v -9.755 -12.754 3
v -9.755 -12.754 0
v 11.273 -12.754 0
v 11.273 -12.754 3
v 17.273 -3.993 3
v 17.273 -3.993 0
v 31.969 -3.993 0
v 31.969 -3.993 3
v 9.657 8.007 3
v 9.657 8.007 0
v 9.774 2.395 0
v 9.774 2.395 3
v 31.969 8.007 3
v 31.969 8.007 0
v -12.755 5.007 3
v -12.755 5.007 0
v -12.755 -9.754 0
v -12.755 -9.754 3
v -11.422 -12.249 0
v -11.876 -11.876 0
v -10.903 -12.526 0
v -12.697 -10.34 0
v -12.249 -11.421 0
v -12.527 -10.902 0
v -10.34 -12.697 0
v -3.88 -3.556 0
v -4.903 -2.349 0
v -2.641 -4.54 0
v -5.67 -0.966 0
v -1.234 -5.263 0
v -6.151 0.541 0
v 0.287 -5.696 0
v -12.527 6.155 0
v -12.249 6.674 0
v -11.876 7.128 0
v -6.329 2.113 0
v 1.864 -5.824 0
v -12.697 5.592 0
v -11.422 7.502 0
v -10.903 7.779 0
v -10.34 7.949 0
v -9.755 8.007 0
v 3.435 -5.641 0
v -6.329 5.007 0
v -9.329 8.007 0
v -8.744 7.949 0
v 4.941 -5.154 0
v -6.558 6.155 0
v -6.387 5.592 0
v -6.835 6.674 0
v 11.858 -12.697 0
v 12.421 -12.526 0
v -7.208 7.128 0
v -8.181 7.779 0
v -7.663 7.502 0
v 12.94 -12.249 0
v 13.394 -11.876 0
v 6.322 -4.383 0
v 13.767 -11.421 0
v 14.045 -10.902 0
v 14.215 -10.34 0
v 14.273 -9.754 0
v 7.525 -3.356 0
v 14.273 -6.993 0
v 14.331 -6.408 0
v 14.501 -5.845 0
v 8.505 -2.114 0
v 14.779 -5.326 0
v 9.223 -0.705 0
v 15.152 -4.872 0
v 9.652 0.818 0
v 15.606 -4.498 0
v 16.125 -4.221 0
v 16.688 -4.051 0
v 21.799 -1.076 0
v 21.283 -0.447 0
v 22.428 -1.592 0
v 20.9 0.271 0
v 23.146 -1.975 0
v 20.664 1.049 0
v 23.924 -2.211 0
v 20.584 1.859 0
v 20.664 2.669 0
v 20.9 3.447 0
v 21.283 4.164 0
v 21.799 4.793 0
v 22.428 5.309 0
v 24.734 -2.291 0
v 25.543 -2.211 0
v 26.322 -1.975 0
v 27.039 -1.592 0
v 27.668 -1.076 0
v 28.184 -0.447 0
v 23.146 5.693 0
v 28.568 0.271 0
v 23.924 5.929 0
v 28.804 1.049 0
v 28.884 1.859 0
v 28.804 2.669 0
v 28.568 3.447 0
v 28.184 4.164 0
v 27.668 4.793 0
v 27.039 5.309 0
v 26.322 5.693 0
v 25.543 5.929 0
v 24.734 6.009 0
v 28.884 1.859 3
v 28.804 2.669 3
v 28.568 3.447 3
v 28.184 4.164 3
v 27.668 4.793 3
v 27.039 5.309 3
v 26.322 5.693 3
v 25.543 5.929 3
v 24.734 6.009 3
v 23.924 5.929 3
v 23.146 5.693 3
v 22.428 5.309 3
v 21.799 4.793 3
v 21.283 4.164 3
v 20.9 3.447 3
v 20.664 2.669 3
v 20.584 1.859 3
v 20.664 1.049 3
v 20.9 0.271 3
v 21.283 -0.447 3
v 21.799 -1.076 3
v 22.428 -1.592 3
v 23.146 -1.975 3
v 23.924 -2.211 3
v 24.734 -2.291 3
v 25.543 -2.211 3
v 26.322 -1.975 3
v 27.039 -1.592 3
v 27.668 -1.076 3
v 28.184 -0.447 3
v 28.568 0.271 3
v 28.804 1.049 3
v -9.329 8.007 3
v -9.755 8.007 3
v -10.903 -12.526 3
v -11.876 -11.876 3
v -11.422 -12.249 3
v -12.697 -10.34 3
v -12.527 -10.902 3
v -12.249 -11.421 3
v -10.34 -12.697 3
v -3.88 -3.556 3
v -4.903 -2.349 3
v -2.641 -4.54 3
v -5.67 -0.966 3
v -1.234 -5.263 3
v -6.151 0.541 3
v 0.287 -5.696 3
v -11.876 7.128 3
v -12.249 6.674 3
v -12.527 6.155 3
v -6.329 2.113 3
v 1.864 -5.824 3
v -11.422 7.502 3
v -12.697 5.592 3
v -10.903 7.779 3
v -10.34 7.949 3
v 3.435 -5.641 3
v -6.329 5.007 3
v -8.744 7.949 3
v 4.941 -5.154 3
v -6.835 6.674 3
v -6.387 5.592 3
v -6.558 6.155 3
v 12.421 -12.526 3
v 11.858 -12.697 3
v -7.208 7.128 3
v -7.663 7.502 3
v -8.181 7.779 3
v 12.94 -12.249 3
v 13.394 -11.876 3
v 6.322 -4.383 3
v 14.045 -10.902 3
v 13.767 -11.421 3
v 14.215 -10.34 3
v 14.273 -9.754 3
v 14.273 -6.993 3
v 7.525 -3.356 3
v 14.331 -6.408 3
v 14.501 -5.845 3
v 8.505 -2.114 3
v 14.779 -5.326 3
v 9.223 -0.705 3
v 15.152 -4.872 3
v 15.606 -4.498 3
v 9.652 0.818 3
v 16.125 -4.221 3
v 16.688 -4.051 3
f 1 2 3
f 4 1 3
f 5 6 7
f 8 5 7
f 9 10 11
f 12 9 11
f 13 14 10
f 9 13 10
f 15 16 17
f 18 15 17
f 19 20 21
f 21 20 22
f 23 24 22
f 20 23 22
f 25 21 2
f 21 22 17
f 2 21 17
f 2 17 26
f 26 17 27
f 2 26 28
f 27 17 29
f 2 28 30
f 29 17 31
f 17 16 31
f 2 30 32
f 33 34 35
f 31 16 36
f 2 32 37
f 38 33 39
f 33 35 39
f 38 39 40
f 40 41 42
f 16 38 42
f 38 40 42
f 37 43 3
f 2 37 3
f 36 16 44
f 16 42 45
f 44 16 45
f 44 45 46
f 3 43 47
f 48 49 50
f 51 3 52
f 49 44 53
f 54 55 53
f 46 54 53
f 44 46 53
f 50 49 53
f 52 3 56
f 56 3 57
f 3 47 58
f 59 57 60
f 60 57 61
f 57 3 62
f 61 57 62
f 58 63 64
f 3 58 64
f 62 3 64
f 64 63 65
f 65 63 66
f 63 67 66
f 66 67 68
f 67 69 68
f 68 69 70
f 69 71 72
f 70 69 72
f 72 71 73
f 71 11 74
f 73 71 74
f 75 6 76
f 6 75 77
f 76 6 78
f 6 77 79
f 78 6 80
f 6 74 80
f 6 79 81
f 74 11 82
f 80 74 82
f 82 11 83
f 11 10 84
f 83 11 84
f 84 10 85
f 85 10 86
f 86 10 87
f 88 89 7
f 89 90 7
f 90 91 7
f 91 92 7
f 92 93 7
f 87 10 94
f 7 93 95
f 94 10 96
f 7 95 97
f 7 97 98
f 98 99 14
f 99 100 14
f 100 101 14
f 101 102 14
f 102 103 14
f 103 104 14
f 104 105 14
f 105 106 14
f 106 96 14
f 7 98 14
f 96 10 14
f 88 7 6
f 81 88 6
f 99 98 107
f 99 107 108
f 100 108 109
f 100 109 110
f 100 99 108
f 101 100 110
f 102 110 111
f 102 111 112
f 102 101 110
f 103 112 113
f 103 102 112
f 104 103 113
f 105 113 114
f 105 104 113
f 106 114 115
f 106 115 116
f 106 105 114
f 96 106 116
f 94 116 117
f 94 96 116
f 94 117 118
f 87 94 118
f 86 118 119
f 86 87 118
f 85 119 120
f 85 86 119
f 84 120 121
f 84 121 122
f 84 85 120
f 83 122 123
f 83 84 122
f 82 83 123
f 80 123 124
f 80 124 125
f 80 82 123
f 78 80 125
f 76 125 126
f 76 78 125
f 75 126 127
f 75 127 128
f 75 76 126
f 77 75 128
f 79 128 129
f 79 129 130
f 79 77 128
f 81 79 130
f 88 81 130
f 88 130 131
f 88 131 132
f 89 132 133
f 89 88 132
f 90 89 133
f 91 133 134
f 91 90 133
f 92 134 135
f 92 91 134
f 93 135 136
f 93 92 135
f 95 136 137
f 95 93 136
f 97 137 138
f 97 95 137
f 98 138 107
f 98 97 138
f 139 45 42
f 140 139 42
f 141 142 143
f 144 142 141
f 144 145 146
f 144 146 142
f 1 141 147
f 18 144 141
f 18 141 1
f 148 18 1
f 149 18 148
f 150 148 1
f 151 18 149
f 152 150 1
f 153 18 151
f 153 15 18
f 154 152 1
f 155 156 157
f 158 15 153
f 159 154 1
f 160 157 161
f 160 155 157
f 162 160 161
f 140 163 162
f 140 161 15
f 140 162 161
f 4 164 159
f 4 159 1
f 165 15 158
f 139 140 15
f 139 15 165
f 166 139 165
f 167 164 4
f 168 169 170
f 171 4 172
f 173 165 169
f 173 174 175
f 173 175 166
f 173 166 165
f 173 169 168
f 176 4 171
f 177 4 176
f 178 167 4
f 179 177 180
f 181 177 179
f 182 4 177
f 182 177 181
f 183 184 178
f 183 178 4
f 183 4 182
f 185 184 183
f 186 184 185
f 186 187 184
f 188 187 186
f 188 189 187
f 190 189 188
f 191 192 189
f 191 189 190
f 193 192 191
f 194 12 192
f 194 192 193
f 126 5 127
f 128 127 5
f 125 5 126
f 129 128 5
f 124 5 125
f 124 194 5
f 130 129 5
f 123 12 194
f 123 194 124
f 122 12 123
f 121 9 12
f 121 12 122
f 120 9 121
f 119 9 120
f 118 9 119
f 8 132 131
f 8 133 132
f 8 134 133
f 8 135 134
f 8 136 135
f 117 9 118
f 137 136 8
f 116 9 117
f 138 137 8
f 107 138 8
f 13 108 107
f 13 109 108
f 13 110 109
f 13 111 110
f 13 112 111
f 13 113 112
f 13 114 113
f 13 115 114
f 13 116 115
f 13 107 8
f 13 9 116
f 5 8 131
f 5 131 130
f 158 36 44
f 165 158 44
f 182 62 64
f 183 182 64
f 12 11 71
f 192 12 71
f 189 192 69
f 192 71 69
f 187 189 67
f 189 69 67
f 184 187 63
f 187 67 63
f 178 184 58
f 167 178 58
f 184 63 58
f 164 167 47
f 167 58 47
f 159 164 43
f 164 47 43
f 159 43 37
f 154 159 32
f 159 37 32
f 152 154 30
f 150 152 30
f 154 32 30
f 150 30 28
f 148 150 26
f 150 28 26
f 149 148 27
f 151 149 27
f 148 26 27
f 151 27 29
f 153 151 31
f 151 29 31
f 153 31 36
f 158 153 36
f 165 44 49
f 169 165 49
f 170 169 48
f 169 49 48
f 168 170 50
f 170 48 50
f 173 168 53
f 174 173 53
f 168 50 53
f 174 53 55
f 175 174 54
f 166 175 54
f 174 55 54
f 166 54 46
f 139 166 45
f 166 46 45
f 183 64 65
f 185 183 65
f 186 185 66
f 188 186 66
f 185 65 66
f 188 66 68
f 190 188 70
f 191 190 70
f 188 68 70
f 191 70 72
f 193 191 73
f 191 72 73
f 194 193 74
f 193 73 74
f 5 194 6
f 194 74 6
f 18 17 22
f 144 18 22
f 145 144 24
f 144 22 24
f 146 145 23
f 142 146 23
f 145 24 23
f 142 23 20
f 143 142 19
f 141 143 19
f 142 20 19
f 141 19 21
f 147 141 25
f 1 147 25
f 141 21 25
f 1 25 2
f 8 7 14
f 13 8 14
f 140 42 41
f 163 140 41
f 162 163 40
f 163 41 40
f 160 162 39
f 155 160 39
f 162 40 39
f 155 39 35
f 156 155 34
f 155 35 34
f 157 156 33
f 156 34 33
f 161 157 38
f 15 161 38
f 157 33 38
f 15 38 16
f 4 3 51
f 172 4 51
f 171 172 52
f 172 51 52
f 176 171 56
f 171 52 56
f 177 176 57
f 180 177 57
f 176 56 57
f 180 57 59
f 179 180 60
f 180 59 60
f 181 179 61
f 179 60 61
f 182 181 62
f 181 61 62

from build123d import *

# Parameters (mm, degrees)
F0_R     = 4.15
F1_DEPTH = 3


with BuildPart() as f1:
    # F0 (on Top) → F1 (new body)
    with BuildSketch(Plane.XY):
        with BuildLine():
            Line((31.969267, -3.992904), (31.969267, 8.007096))
            Line((31.969267, 8.007096), (9.657442, 8.007096))
            Line((9.657442, 8.007096), (9.774258, 2.39539))
            ThreePointArc((9.774258, 2.39539), (1.864099, -5.824019), (-6.329272, 2.113106))
            ThreePointArc((-6.329272, 2.113106), (-6.330089, 2.22779), (-6.329272, 2.342473))
            Line((-6.329272, 2.342473), (-6.329272, 5.007096))
            ThreePointArc((-6.329272, 5.007096), (-7.207952, 7.128417), (-9.329272, 8.007096))
            Line((-9.329272, 8.007096), (-9.754942, 8.007096))
            ThreePointArc((-9.754942, 8.007096), (-11.876262, 7.128417), (-12.754942, 5.007096))
            Line((-12.754942, 5.007096), (-12.754942, -9.754244))
            ThreePointArc((-12.754942, -9.754244), (-11.876262, -11.875564), (-9.754942, -12.754244))
            Line((-9.754942, -12.754244), (11.273001, -12.754244))
            ThreePointArc((11.273001, -12.754244), (13.394322, -11.875564), (14.273001, -9.754244))
            Line((14.273001, -9.754244), (14.273001, -6.992904))
            ThreePointArc((14.273001, -6.992904), (15.151681, -4.871583), (17.273001, -3.992904))
            Line((17.273001, -3.992904), (31.969267, -3.992904))
        make_face()
        with Locations((24.733823, 1.858876)):
            Circle(F0_R, mode=Mode.SUBTRACT)
        with BuildLine():
            ThreePointArc((-6.329272, 2.342473), (-6.330089, 2.22779), (-6.329272, 2.113106))
            Line((-6.329272, 2.113106), (-6.329272, 2.342473))
        make_face()
    extrude(amount=F1_DEPTH)


solid = f1.part
